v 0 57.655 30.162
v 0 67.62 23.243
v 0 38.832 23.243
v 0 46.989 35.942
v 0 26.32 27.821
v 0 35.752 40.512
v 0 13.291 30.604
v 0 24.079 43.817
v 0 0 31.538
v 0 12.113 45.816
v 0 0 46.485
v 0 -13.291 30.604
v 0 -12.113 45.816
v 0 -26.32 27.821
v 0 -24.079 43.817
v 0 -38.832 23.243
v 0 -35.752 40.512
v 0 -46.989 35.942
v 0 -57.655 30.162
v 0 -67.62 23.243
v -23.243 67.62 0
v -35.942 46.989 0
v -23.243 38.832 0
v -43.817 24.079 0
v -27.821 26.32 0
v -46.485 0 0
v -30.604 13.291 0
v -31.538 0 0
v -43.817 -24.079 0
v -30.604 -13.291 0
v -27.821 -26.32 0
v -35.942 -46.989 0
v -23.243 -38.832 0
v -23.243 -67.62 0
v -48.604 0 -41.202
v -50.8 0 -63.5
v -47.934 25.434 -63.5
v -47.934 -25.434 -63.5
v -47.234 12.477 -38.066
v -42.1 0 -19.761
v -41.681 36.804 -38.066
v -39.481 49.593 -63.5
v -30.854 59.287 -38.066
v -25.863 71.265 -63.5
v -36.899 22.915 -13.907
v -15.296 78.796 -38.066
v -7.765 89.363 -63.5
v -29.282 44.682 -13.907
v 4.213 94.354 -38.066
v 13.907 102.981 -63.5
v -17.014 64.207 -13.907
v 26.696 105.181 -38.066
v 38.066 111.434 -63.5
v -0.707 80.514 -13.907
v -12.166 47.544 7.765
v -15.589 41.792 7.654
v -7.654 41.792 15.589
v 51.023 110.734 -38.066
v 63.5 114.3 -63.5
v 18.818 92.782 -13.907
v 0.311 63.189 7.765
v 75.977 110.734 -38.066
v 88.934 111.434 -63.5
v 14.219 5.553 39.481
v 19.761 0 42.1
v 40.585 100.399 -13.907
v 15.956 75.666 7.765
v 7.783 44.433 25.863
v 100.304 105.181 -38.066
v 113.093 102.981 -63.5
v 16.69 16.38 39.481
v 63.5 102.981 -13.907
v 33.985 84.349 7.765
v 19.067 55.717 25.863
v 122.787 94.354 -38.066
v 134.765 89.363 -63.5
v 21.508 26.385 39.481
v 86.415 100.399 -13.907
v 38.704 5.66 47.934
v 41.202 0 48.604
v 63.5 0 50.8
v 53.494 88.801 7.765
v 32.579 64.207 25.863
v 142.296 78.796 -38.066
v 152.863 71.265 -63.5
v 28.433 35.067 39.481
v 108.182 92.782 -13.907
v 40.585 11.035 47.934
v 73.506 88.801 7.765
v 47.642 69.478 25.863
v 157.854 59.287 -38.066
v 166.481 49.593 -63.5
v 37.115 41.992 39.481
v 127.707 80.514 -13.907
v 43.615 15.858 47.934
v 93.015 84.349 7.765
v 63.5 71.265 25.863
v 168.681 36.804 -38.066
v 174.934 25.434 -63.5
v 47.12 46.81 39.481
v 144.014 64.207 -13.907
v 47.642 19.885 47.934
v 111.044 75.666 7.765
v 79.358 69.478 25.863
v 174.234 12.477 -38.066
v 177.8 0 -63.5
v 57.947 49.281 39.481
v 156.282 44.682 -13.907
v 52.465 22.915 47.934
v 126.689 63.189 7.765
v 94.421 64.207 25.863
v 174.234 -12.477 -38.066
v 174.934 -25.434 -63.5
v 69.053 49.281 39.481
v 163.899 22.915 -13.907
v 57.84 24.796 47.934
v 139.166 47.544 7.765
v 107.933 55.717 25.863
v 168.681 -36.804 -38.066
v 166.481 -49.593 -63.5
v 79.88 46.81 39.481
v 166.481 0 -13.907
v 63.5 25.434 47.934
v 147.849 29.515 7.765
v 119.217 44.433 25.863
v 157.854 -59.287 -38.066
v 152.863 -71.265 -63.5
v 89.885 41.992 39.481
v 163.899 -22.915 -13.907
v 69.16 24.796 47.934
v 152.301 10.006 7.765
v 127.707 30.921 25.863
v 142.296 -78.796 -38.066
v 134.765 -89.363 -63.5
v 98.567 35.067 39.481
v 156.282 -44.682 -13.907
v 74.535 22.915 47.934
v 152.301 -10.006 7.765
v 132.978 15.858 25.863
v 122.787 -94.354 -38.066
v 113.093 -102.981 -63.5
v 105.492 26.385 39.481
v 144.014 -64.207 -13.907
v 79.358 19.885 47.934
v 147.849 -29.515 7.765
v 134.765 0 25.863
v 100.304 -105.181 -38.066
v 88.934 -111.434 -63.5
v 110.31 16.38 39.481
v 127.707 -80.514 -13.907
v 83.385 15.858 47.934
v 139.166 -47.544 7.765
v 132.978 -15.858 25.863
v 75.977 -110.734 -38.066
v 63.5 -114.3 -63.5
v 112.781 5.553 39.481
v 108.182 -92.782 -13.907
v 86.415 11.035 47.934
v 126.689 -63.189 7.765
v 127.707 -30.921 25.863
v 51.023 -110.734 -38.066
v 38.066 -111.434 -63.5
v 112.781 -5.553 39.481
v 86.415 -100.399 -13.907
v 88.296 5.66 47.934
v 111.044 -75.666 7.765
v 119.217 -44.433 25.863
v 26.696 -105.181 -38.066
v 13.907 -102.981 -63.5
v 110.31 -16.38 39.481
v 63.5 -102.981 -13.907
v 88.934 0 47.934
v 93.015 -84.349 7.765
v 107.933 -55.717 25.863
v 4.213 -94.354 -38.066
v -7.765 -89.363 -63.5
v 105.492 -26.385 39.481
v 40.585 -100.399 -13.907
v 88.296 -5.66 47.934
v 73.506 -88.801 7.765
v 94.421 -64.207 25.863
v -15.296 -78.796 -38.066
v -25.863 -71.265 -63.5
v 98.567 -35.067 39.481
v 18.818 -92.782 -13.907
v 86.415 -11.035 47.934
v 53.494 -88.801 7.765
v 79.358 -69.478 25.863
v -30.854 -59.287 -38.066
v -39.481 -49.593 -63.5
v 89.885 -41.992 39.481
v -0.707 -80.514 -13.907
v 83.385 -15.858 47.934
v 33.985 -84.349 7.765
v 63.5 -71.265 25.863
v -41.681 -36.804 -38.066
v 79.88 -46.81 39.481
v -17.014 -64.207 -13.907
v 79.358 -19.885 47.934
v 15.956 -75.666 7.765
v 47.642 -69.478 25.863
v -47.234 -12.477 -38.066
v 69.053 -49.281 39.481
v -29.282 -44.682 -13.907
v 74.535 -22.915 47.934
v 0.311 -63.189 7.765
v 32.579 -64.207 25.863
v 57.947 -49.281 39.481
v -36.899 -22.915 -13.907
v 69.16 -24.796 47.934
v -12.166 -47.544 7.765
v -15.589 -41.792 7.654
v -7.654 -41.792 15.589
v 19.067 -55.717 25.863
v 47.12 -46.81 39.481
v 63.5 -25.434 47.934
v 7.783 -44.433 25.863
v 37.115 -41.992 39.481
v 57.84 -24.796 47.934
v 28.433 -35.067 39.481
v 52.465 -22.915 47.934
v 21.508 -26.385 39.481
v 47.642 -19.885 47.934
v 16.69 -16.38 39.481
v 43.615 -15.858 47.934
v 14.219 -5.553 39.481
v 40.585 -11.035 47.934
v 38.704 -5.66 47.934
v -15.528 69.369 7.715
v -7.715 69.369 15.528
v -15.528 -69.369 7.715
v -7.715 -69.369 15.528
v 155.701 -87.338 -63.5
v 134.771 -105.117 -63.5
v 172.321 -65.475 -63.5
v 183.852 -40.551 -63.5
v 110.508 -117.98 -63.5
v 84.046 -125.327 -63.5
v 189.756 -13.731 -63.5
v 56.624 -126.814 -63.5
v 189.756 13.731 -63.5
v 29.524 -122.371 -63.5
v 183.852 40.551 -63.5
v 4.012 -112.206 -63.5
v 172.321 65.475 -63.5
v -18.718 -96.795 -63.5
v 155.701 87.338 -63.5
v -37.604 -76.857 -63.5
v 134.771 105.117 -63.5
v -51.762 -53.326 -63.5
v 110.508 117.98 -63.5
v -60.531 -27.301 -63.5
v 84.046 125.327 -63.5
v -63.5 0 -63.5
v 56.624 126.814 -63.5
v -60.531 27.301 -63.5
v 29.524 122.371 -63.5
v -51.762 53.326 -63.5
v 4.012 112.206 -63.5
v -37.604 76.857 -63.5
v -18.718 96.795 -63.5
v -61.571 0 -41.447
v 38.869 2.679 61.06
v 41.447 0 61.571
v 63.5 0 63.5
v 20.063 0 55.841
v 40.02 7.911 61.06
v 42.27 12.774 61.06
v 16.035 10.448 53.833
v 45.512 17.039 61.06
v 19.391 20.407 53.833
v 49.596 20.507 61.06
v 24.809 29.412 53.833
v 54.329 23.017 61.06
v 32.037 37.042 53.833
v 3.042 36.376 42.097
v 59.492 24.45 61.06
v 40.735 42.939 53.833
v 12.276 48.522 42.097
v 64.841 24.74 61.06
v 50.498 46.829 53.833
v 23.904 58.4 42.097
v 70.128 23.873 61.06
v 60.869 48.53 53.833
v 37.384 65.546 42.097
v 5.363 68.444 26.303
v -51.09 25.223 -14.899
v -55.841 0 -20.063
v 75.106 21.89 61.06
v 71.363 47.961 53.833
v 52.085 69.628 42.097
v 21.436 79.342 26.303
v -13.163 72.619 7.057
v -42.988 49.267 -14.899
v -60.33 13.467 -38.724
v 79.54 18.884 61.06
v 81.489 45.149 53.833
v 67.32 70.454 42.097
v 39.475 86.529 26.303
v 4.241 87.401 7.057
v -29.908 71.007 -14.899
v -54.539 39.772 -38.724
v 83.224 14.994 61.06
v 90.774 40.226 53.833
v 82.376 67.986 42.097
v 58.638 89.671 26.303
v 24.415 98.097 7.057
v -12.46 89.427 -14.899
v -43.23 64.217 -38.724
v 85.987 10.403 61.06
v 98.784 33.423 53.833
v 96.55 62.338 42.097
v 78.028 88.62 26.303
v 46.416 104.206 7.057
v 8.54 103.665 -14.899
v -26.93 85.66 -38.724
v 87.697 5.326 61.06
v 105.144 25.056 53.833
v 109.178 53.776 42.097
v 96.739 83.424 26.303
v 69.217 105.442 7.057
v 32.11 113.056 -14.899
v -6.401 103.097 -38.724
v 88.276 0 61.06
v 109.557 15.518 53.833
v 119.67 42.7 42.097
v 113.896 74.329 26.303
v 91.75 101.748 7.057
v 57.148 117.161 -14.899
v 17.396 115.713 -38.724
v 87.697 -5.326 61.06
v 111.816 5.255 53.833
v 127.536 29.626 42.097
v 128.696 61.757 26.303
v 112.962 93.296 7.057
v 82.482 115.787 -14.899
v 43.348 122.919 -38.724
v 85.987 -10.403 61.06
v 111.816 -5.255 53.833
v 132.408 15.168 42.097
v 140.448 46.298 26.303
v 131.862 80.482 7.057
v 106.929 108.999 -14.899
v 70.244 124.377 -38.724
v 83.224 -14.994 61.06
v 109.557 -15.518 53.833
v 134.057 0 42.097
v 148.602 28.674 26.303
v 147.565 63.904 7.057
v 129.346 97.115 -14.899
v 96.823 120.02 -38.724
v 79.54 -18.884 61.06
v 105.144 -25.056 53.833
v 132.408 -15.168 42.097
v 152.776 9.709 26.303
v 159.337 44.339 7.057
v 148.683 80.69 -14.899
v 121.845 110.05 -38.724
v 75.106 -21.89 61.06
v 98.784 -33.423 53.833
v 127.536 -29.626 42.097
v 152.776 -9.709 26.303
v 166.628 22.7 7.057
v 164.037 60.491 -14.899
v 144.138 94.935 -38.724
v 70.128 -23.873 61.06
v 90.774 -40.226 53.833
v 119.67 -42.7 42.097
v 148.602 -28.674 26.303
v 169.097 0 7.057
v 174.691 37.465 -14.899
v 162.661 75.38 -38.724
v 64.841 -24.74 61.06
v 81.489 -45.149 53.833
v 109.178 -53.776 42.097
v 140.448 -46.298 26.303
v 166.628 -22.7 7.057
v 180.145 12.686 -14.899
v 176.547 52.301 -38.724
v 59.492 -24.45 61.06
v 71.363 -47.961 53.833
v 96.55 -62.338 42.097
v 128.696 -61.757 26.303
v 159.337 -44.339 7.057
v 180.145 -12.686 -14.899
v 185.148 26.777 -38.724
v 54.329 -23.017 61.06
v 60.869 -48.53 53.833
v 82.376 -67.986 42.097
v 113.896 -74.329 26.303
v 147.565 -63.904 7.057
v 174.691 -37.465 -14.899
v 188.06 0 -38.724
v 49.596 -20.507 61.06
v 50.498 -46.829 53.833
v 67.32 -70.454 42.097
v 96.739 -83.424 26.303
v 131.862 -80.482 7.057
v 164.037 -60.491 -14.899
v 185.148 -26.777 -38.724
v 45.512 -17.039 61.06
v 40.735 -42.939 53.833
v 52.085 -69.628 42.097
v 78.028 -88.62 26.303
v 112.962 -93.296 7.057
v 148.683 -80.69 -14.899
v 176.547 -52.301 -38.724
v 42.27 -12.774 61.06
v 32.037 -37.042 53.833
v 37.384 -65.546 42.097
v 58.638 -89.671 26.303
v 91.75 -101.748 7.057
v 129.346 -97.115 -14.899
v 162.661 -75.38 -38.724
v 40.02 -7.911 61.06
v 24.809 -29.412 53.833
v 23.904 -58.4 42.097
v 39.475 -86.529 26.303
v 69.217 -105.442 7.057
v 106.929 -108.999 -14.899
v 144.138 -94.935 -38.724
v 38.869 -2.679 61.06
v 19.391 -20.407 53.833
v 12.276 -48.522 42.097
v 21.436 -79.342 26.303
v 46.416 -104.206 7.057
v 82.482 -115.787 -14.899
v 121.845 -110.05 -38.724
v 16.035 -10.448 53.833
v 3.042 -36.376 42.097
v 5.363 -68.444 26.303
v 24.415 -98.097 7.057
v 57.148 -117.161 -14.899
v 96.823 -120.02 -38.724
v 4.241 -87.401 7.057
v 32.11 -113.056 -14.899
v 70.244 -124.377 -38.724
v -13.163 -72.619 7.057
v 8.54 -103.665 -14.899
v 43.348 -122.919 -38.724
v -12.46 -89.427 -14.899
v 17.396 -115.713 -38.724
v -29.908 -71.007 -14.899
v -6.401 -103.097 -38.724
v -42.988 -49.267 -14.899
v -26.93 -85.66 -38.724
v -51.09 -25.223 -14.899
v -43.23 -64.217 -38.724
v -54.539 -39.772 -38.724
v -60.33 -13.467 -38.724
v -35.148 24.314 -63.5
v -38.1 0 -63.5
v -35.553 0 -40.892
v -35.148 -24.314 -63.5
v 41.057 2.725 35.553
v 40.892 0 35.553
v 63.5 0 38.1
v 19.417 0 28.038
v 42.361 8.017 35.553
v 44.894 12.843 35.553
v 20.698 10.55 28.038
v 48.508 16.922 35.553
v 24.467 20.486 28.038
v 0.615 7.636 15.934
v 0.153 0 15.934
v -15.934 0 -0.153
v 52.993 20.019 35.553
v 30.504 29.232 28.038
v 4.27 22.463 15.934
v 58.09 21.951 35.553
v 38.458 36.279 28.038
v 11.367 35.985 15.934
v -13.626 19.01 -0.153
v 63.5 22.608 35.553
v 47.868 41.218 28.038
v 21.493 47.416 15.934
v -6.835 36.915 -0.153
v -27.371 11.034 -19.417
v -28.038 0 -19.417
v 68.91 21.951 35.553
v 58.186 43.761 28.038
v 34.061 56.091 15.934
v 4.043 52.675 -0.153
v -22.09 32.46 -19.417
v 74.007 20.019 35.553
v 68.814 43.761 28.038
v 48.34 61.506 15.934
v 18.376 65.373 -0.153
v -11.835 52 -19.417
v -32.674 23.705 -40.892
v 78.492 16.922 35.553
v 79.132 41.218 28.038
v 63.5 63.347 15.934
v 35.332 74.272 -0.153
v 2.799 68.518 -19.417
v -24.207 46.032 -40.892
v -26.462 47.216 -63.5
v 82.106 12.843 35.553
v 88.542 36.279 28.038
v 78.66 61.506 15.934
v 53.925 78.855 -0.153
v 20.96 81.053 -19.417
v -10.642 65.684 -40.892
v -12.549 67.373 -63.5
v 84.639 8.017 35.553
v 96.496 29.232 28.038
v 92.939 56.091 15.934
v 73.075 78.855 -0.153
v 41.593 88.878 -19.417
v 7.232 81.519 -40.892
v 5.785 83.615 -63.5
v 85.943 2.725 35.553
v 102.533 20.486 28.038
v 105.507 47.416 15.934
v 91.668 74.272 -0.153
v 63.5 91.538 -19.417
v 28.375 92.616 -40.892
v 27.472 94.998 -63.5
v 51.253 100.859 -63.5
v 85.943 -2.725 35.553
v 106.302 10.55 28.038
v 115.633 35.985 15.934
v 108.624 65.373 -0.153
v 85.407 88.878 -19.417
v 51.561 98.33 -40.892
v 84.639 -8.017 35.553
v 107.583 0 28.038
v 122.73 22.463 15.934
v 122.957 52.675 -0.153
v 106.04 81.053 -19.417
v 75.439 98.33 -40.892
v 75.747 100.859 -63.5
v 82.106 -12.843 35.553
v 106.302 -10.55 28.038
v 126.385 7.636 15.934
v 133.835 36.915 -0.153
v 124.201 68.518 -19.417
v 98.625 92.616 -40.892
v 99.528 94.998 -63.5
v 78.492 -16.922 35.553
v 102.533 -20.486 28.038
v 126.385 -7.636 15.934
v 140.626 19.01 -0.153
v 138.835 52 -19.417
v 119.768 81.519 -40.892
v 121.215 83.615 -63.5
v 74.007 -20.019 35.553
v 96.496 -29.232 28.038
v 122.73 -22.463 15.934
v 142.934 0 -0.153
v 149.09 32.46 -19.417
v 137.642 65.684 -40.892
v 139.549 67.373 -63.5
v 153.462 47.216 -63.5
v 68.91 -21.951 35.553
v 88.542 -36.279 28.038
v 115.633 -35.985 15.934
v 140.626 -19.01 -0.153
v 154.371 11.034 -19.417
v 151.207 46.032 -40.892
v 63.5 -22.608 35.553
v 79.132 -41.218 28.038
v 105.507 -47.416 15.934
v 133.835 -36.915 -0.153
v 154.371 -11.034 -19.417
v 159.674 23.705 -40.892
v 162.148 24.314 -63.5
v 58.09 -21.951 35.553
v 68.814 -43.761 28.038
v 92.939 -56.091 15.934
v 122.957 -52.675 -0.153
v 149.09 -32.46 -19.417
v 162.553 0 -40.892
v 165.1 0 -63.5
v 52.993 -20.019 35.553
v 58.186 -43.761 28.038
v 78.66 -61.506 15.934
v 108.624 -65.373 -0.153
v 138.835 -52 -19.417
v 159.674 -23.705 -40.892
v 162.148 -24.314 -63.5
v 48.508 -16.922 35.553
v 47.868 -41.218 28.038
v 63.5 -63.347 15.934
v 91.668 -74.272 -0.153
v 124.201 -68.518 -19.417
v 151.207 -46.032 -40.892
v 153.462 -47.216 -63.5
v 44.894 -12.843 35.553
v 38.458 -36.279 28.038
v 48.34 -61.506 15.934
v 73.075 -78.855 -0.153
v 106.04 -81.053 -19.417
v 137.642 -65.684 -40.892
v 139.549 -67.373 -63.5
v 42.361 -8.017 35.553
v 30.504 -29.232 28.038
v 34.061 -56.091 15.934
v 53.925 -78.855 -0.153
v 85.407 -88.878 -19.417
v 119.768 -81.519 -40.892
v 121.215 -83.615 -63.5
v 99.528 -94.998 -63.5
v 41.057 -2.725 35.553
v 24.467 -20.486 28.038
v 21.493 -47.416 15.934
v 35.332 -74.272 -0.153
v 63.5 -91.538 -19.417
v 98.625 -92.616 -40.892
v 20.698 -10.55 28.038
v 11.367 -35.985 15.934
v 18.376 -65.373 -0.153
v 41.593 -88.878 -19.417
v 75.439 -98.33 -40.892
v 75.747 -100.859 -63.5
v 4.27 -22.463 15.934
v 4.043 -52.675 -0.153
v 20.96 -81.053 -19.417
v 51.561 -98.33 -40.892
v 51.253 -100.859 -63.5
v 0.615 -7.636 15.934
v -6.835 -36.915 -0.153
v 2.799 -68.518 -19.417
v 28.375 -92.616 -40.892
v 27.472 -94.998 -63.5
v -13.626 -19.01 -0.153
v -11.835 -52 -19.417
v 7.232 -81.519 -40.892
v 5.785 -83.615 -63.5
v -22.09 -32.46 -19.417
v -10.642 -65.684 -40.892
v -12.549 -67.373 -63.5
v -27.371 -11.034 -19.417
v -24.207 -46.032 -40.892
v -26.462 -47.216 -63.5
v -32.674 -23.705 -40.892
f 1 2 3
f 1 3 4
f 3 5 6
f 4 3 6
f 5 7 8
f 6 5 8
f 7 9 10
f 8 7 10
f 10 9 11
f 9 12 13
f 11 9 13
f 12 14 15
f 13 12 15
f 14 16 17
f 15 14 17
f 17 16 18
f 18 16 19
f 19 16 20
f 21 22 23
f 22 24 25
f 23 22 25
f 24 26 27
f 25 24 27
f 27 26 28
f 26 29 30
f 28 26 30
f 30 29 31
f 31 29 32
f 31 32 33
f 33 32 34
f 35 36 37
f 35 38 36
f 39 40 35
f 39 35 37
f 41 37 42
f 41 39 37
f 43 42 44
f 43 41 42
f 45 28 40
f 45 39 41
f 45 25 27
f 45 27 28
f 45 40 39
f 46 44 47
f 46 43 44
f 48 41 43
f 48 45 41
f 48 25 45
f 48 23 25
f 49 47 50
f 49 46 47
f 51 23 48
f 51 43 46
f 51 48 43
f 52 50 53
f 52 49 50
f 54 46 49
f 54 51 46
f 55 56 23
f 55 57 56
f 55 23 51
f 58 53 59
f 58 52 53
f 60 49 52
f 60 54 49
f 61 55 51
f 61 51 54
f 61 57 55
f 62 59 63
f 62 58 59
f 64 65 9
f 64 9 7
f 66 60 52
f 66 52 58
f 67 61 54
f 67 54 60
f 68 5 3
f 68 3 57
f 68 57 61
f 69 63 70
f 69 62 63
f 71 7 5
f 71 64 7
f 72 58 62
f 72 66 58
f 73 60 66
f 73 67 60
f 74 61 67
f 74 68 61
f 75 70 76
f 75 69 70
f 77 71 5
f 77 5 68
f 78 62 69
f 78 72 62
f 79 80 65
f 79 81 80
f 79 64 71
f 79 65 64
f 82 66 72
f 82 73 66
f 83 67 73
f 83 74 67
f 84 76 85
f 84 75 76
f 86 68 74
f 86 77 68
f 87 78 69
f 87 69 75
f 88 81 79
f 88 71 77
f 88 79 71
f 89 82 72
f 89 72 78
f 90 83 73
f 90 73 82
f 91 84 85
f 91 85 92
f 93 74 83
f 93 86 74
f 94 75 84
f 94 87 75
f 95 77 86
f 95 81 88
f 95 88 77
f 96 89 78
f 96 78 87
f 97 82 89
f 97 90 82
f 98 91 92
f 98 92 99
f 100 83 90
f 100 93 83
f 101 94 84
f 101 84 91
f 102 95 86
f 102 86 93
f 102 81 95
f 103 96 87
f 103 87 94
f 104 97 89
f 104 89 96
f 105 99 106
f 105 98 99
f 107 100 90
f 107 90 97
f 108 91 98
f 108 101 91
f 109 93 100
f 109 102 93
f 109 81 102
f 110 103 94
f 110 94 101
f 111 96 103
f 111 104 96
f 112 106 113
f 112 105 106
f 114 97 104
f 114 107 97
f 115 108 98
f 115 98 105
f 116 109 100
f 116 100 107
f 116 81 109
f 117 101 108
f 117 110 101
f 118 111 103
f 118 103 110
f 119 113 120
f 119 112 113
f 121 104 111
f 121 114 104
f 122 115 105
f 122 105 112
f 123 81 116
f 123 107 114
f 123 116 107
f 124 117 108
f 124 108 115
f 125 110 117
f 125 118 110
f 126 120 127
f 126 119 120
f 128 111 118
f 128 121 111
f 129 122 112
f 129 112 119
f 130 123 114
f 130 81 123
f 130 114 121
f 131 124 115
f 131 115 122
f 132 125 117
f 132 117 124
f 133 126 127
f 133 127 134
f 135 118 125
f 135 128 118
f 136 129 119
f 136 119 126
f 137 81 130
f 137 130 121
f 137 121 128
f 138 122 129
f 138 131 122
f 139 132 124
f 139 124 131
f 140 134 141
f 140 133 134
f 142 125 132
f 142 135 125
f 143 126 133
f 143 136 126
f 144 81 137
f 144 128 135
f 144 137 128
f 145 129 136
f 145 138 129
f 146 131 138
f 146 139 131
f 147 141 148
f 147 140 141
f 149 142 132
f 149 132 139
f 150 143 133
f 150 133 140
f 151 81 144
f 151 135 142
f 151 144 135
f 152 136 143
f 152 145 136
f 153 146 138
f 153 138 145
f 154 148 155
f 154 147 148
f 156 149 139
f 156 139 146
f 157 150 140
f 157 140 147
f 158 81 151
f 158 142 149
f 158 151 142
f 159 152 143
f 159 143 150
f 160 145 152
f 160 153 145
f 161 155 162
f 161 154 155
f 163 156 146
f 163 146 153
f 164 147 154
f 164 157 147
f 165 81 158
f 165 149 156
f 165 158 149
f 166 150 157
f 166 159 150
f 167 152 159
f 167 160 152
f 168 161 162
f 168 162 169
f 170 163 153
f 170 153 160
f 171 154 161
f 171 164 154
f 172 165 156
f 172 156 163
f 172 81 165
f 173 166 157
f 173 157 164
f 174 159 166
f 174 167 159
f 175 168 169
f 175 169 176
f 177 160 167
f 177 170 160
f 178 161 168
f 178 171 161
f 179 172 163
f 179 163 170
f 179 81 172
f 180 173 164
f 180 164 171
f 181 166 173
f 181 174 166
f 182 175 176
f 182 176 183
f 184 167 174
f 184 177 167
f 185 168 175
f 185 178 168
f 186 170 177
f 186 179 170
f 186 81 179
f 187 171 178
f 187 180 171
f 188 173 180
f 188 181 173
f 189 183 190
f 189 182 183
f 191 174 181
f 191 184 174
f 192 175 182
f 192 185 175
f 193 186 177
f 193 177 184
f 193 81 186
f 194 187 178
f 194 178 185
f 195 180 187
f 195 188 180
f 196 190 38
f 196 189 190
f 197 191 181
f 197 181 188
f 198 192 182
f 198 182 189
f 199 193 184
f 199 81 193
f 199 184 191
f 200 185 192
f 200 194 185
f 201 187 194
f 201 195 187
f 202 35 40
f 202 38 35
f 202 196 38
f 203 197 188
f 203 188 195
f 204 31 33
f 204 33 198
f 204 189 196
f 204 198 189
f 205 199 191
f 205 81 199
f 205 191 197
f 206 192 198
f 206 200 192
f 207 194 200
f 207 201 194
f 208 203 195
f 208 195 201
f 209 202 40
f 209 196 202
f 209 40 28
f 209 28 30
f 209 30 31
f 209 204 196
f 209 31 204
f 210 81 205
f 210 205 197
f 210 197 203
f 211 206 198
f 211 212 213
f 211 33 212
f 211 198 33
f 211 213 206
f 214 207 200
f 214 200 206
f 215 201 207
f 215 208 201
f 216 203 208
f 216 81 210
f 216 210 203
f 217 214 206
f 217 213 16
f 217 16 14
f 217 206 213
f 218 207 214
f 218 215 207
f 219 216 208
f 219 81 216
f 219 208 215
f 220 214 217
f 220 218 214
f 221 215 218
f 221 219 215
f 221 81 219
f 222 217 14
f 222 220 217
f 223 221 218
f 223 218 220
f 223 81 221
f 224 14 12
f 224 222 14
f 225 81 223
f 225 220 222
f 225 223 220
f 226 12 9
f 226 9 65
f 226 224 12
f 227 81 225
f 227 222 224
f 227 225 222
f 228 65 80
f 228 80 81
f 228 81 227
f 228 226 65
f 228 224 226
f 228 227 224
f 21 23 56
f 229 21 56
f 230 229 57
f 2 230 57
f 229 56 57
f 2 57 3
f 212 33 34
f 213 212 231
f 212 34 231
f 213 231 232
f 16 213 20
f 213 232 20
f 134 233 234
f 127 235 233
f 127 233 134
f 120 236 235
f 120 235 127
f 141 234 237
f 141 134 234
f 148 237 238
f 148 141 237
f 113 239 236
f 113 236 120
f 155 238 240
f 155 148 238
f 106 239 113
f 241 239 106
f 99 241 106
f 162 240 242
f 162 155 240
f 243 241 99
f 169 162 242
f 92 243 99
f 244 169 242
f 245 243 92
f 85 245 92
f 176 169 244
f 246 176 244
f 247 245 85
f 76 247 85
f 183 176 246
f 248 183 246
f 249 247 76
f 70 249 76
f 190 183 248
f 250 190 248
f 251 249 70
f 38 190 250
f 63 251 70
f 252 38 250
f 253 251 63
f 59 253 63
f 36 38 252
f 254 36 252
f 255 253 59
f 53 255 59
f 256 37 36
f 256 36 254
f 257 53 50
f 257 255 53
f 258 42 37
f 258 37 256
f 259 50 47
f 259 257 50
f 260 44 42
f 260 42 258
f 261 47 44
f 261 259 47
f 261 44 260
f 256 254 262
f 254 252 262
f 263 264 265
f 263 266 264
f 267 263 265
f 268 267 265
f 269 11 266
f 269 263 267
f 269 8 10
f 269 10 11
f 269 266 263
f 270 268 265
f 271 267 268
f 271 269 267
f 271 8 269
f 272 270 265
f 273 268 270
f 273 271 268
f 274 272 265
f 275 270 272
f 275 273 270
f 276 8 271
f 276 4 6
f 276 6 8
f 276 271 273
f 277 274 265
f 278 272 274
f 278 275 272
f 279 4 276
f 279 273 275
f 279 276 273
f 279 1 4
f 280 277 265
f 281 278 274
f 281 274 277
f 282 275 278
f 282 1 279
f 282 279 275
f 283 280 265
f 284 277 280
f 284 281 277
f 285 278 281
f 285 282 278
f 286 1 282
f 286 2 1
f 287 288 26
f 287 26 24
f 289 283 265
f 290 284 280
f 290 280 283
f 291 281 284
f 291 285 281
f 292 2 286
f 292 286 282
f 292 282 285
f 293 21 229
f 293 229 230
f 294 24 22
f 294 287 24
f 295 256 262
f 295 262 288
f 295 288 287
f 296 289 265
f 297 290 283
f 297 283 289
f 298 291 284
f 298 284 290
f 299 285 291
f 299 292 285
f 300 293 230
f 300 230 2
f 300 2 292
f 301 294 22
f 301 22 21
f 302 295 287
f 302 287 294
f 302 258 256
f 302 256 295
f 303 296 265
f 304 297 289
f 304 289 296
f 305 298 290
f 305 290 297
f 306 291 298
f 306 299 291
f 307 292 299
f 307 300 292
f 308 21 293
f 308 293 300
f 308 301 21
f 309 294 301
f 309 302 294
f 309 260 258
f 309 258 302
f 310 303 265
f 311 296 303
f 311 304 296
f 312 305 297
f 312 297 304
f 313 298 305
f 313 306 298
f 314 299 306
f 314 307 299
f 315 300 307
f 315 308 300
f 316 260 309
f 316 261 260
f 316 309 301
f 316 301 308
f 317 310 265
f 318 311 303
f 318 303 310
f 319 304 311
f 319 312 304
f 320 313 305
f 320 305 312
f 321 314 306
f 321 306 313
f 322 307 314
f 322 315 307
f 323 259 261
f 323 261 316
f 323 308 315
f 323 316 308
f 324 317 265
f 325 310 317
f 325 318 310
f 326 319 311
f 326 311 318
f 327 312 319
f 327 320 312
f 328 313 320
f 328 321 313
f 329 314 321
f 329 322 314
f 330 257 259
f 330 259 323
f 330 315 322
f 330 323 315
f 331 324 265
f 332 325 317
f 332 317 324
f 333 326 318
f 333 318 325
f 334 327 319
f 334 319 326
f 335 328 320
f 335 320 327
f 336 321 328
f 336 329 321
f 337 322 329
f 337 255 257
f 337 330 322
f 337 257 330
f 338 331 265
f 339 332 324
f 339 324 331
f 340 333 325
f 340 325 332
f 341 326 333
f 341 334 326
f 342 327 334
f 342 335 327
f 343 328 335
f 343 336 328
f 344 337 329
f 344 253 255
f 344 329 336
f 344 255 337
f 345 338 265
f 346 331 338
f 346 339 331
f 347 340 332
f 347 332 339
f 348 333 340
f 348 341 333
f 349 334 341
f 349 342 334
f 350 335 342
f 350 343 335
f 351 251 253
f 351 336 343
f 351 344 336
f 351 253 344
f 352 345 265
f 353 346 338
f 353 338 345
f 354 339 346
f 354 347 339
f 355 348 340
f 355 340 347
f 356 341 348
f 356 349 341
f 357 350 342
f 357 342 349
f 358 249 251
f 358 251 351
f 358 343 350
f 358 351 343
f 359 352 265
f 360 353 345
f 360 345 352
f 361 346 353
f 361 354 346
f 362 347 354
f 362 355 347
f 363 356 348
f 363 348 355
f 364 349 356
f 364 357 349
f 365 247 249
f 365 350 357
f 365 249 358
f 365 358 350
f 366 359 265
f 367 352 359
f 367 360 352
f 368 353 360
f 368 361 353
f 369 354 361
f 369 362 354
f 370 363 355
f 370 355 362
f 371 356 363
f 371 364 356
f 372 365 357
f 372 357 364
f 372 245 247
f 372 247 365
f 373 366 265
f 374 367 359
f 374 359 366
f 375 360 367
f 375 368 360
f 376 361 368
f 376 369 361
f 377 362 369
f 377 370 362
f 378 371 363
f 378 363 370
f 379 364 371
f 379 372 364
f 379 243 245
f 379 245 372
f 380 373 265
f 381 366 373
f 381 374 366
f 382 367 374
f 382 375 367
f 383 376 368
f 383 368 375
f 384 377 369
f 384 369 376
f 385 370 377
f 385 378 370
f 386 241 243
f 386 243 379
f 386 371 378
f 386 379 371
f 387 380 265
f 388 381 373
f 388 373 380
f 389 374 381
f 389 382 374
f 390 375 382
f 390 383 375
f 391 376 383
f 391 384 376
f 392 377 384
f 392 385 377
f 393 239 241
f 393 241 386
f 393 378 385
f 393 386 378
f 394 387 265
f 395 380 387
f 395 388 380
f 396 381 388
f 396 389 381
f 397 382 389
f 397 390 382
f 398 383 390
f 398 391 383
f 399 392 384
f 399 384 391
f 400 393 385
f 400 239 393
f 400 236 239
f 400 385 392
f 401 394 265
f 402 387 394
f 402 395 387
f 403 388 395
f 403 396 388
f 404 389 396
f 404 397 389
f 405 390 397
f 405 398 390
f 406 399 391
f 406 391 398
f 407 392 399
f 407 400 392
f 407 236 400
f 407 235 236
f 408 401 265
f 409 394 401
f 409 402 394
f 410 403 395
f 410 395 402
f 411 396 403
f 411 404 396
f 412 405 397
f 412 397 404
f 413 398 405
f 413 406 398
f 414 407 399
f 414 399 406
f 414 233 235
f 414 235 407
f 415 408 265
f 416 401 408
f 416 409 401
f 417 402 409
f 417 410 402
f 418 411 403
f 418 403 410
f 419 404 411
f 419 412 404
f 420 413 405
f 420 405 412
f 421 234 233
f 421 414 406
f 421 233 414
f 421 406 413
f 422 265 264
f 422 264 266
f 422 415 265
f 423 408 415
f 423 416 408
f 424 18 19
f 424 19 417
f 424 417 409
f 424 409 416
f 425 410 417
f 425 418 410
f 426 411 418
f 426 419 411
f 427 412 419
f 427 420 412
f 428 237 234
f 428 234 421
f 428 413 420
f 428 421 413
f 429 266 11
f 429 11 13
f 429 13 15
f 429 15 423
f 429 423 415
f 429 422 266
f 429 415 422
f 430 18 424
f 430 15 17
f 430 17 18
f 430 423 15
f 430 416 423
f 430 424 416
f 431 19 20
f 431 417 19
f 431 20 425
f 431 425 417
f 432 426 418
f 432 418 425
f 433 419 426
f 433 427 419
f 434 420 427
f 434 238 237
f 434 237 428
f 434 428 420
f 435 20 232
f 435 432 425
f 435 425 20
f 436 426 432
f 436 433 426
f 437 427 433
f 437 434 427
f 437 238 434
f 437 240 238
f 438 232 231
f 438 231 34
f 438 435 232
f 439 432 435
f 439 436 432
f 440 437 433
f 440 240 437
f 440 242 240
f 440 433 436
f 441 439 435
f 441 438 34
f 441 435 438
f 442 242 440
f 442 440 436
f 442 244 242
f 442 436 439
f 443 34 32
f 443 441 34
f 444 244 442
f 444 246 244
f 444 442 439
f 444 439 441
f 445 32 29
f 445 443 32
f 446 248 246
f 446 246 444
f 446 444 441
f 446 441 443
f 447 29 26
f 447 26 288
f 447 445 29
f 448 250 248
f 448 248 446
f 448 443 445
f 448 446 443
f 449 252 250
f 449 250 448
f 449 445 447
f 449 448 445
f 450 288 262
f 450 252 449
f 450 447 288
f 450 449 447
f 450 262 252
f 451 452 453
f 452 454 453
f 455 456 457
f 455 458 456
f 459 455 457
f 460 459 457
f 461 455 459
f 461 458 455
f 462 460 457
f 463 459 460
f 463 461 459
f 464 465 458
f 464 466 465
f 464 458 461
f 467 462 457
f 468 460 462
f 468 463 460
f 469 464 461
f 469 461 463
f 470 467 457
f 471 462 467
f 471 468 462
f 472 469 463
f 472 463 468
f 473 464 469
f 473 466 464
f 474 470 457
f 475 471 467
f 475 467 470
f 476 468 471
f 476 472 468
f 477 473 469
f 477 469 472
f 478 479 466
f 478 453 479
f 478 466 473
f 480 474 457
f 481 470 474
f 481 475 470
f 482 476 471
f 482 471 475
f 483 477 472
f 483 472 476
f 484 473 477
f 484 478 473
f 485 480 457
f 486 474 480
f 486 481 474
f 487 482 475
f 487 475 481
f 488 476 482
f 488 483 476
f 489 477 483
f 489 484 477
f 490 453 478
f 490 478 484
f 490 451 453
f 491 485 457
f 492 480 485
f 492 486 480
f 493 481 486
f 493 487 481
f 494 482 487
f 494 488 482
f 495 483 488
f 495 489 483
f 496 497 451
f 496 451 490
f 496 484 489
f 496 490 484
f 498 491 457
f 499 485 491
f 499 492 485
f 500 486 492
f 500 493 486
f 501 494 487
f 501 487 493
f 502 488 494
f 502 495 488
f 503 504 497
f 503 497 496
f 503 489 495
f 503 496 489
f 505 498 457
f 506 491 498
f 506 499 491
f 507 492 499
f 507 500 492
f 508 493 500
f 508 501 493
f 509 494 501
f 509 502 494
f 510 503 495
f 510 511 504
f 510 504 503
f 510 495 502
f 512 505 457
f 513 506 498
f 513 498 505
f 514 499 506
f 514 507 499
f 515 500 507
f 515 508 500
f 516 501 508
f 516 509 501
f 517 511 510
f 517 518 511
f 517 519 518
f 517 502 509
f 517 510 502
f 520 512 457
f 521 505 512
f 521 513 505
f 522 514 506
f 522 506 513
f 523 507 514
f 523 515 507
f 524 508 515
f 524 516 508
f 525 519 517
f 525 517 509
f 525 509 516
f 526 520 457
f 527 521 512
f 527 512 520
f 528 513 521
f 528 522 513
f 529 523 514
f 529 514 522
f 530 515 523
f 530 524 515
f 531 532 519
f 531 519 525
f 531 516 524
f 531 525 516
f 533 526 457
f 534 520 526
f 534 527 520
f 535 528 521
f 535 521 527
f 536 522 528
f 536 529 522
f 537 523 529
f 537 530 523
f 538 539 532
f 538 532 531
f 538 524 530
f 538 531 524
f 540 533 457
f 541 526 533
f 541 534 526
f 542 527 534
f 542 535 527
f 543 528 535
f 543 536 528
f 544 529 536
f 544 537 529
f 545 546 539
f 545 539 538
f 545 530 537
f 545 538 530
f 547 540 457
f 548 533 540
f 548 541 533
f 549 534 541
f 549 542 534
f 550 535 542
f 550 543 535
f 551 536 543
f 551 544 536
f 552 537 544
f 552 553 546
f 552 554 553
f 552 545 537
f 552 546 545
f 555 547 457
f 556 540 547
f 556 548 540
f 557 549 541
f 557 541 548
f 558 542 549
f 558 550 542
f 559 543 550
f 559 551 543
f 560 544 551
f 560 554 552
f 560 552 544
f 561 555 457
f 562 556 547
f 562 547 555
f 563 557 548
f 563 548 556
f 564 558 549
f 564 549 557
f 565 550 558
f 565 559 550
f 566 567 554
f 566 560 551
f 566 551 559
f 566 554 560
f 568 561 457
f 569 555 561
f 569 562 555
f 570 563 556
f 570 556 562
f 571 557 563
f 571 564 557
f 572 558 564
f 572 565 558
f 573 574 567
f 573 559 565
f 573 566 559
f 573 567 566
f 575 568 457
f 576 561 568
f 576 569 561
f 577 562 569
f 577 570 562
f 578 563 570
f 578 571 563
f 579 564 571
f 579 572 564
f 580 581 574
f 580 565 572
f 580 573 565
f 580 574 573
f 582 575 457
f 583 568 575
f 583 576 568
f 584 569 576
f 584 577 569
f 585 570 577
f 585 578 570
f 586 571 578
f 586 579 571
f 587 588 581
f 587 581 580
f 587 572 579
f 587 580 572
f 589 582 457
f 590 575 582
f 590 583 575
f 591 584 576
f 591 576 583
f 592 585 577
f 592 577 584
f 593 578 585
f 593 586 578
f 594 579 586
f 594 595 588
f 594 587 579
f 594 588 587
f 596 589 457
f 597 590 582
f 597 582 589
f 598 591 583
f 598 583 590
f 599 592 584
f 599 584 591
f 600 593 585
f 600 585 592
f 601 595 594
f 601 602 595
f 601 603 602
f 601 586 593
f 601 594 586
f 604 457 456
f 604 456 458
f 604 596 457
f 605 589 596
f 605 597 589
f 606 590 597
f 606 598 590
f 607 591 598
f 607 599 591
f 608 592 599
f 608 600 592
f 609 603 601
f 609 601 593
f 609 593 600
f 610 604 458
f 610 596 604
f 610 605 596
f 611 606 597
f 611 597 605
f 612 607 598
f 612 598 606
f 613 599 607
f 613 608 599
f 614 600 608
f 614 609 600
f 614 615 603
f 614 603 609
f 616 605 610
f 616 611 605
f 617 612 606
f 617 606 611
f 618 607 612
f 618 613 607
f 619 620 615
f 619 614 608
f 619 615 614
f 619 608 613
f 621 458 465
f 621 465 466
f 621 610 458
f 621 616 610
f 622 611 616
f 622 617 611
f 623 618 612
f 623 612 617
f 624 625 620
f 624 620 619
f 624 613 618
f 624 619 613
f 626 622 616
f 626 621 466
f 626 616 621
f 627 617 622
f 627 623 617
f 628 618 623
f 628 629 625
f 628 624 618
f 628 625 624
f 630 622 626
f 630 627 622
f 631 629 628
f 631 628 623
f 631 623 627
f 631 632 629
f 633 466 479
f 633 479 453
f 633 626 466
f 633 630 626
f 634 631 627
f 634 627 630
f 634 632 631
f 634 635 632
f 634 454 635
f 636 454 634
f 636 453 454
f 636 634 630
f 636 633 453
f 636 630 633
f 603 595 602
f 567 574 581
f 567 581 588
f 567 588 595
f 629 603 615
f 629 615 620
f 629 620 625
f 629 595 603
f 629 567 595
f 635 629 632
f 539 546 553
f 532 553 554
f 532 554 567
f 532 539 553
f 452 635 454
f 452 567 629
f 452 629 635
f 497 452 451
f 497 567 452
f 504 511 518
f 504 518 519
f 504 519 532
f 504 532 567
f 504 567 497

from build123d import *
from build123d import SkipClean  # not in build123d's __all__

# Parameters (mm, degrees)
F3_DEPTH = 127


with BuildPart() as f1:
    # F0 (on Front) → F1 (revolve)
    with BuildSketch(Plane.XZ):
        with BuildLine():
            Line((-63.5, -63.5), (-50.8, -63.5))
            ThreePointArc((-50.8, -63.5), (-17.3223050896, 17.3223050896), (63.5, 50.8))
            Line((63.5, 50.8), (63.5, 63.5))
            ThreePointArc((63.5, 63.5), (-26.3025612107, 26.3025612107), (-63.5, -63.5))
        make_face()
    revolve(axis=Axis((63.5, 0, 0), (0, 0, -1)))

    # F2 (on Front) → F3 (cut, symmetric)
    with BuildSketch(Plane.XZ):
        with BuildLine():
            Line((-46.4852262806, 0), (0, 46.4852262806))
            ThreePointArc((0, 46.4852262806), (-26.3025612107, 26.3025612107), (-46.4852262806, 0))
        make_face()
        Polygon((0, 23.2426131403), (0, 46.4852262806), (-46.4852262806, 0), (-23.2426131403, 0), align=None)
    with SkipClean():  # cleaning this boolean's faces spoils the solid; the shape is the same uncleaned
        extrude(amount=F3_DEPTH, both=True, mode=Mode.SUBTRACT)


with BuildPart() as f1b:
    # F0 (on Front) → F1, piece 2 (revolve)
    with BuildSketch(Plane.XZ):
        with BuildLine():
            Line((-38.1, -63.5), (63.5, -63.5))
            Line((63.5, -63.5), (63.5, 38.1))
            ThreePointArc((63.5, 38.1), (-8.3420489686, 8.3420489686), (-38.1, -63.5))
        make_face()
    revolve(axis=Axis((63.5, 0, 0), (0, 0, -1)))


solid = Compound([f1.part, f1b.part])
